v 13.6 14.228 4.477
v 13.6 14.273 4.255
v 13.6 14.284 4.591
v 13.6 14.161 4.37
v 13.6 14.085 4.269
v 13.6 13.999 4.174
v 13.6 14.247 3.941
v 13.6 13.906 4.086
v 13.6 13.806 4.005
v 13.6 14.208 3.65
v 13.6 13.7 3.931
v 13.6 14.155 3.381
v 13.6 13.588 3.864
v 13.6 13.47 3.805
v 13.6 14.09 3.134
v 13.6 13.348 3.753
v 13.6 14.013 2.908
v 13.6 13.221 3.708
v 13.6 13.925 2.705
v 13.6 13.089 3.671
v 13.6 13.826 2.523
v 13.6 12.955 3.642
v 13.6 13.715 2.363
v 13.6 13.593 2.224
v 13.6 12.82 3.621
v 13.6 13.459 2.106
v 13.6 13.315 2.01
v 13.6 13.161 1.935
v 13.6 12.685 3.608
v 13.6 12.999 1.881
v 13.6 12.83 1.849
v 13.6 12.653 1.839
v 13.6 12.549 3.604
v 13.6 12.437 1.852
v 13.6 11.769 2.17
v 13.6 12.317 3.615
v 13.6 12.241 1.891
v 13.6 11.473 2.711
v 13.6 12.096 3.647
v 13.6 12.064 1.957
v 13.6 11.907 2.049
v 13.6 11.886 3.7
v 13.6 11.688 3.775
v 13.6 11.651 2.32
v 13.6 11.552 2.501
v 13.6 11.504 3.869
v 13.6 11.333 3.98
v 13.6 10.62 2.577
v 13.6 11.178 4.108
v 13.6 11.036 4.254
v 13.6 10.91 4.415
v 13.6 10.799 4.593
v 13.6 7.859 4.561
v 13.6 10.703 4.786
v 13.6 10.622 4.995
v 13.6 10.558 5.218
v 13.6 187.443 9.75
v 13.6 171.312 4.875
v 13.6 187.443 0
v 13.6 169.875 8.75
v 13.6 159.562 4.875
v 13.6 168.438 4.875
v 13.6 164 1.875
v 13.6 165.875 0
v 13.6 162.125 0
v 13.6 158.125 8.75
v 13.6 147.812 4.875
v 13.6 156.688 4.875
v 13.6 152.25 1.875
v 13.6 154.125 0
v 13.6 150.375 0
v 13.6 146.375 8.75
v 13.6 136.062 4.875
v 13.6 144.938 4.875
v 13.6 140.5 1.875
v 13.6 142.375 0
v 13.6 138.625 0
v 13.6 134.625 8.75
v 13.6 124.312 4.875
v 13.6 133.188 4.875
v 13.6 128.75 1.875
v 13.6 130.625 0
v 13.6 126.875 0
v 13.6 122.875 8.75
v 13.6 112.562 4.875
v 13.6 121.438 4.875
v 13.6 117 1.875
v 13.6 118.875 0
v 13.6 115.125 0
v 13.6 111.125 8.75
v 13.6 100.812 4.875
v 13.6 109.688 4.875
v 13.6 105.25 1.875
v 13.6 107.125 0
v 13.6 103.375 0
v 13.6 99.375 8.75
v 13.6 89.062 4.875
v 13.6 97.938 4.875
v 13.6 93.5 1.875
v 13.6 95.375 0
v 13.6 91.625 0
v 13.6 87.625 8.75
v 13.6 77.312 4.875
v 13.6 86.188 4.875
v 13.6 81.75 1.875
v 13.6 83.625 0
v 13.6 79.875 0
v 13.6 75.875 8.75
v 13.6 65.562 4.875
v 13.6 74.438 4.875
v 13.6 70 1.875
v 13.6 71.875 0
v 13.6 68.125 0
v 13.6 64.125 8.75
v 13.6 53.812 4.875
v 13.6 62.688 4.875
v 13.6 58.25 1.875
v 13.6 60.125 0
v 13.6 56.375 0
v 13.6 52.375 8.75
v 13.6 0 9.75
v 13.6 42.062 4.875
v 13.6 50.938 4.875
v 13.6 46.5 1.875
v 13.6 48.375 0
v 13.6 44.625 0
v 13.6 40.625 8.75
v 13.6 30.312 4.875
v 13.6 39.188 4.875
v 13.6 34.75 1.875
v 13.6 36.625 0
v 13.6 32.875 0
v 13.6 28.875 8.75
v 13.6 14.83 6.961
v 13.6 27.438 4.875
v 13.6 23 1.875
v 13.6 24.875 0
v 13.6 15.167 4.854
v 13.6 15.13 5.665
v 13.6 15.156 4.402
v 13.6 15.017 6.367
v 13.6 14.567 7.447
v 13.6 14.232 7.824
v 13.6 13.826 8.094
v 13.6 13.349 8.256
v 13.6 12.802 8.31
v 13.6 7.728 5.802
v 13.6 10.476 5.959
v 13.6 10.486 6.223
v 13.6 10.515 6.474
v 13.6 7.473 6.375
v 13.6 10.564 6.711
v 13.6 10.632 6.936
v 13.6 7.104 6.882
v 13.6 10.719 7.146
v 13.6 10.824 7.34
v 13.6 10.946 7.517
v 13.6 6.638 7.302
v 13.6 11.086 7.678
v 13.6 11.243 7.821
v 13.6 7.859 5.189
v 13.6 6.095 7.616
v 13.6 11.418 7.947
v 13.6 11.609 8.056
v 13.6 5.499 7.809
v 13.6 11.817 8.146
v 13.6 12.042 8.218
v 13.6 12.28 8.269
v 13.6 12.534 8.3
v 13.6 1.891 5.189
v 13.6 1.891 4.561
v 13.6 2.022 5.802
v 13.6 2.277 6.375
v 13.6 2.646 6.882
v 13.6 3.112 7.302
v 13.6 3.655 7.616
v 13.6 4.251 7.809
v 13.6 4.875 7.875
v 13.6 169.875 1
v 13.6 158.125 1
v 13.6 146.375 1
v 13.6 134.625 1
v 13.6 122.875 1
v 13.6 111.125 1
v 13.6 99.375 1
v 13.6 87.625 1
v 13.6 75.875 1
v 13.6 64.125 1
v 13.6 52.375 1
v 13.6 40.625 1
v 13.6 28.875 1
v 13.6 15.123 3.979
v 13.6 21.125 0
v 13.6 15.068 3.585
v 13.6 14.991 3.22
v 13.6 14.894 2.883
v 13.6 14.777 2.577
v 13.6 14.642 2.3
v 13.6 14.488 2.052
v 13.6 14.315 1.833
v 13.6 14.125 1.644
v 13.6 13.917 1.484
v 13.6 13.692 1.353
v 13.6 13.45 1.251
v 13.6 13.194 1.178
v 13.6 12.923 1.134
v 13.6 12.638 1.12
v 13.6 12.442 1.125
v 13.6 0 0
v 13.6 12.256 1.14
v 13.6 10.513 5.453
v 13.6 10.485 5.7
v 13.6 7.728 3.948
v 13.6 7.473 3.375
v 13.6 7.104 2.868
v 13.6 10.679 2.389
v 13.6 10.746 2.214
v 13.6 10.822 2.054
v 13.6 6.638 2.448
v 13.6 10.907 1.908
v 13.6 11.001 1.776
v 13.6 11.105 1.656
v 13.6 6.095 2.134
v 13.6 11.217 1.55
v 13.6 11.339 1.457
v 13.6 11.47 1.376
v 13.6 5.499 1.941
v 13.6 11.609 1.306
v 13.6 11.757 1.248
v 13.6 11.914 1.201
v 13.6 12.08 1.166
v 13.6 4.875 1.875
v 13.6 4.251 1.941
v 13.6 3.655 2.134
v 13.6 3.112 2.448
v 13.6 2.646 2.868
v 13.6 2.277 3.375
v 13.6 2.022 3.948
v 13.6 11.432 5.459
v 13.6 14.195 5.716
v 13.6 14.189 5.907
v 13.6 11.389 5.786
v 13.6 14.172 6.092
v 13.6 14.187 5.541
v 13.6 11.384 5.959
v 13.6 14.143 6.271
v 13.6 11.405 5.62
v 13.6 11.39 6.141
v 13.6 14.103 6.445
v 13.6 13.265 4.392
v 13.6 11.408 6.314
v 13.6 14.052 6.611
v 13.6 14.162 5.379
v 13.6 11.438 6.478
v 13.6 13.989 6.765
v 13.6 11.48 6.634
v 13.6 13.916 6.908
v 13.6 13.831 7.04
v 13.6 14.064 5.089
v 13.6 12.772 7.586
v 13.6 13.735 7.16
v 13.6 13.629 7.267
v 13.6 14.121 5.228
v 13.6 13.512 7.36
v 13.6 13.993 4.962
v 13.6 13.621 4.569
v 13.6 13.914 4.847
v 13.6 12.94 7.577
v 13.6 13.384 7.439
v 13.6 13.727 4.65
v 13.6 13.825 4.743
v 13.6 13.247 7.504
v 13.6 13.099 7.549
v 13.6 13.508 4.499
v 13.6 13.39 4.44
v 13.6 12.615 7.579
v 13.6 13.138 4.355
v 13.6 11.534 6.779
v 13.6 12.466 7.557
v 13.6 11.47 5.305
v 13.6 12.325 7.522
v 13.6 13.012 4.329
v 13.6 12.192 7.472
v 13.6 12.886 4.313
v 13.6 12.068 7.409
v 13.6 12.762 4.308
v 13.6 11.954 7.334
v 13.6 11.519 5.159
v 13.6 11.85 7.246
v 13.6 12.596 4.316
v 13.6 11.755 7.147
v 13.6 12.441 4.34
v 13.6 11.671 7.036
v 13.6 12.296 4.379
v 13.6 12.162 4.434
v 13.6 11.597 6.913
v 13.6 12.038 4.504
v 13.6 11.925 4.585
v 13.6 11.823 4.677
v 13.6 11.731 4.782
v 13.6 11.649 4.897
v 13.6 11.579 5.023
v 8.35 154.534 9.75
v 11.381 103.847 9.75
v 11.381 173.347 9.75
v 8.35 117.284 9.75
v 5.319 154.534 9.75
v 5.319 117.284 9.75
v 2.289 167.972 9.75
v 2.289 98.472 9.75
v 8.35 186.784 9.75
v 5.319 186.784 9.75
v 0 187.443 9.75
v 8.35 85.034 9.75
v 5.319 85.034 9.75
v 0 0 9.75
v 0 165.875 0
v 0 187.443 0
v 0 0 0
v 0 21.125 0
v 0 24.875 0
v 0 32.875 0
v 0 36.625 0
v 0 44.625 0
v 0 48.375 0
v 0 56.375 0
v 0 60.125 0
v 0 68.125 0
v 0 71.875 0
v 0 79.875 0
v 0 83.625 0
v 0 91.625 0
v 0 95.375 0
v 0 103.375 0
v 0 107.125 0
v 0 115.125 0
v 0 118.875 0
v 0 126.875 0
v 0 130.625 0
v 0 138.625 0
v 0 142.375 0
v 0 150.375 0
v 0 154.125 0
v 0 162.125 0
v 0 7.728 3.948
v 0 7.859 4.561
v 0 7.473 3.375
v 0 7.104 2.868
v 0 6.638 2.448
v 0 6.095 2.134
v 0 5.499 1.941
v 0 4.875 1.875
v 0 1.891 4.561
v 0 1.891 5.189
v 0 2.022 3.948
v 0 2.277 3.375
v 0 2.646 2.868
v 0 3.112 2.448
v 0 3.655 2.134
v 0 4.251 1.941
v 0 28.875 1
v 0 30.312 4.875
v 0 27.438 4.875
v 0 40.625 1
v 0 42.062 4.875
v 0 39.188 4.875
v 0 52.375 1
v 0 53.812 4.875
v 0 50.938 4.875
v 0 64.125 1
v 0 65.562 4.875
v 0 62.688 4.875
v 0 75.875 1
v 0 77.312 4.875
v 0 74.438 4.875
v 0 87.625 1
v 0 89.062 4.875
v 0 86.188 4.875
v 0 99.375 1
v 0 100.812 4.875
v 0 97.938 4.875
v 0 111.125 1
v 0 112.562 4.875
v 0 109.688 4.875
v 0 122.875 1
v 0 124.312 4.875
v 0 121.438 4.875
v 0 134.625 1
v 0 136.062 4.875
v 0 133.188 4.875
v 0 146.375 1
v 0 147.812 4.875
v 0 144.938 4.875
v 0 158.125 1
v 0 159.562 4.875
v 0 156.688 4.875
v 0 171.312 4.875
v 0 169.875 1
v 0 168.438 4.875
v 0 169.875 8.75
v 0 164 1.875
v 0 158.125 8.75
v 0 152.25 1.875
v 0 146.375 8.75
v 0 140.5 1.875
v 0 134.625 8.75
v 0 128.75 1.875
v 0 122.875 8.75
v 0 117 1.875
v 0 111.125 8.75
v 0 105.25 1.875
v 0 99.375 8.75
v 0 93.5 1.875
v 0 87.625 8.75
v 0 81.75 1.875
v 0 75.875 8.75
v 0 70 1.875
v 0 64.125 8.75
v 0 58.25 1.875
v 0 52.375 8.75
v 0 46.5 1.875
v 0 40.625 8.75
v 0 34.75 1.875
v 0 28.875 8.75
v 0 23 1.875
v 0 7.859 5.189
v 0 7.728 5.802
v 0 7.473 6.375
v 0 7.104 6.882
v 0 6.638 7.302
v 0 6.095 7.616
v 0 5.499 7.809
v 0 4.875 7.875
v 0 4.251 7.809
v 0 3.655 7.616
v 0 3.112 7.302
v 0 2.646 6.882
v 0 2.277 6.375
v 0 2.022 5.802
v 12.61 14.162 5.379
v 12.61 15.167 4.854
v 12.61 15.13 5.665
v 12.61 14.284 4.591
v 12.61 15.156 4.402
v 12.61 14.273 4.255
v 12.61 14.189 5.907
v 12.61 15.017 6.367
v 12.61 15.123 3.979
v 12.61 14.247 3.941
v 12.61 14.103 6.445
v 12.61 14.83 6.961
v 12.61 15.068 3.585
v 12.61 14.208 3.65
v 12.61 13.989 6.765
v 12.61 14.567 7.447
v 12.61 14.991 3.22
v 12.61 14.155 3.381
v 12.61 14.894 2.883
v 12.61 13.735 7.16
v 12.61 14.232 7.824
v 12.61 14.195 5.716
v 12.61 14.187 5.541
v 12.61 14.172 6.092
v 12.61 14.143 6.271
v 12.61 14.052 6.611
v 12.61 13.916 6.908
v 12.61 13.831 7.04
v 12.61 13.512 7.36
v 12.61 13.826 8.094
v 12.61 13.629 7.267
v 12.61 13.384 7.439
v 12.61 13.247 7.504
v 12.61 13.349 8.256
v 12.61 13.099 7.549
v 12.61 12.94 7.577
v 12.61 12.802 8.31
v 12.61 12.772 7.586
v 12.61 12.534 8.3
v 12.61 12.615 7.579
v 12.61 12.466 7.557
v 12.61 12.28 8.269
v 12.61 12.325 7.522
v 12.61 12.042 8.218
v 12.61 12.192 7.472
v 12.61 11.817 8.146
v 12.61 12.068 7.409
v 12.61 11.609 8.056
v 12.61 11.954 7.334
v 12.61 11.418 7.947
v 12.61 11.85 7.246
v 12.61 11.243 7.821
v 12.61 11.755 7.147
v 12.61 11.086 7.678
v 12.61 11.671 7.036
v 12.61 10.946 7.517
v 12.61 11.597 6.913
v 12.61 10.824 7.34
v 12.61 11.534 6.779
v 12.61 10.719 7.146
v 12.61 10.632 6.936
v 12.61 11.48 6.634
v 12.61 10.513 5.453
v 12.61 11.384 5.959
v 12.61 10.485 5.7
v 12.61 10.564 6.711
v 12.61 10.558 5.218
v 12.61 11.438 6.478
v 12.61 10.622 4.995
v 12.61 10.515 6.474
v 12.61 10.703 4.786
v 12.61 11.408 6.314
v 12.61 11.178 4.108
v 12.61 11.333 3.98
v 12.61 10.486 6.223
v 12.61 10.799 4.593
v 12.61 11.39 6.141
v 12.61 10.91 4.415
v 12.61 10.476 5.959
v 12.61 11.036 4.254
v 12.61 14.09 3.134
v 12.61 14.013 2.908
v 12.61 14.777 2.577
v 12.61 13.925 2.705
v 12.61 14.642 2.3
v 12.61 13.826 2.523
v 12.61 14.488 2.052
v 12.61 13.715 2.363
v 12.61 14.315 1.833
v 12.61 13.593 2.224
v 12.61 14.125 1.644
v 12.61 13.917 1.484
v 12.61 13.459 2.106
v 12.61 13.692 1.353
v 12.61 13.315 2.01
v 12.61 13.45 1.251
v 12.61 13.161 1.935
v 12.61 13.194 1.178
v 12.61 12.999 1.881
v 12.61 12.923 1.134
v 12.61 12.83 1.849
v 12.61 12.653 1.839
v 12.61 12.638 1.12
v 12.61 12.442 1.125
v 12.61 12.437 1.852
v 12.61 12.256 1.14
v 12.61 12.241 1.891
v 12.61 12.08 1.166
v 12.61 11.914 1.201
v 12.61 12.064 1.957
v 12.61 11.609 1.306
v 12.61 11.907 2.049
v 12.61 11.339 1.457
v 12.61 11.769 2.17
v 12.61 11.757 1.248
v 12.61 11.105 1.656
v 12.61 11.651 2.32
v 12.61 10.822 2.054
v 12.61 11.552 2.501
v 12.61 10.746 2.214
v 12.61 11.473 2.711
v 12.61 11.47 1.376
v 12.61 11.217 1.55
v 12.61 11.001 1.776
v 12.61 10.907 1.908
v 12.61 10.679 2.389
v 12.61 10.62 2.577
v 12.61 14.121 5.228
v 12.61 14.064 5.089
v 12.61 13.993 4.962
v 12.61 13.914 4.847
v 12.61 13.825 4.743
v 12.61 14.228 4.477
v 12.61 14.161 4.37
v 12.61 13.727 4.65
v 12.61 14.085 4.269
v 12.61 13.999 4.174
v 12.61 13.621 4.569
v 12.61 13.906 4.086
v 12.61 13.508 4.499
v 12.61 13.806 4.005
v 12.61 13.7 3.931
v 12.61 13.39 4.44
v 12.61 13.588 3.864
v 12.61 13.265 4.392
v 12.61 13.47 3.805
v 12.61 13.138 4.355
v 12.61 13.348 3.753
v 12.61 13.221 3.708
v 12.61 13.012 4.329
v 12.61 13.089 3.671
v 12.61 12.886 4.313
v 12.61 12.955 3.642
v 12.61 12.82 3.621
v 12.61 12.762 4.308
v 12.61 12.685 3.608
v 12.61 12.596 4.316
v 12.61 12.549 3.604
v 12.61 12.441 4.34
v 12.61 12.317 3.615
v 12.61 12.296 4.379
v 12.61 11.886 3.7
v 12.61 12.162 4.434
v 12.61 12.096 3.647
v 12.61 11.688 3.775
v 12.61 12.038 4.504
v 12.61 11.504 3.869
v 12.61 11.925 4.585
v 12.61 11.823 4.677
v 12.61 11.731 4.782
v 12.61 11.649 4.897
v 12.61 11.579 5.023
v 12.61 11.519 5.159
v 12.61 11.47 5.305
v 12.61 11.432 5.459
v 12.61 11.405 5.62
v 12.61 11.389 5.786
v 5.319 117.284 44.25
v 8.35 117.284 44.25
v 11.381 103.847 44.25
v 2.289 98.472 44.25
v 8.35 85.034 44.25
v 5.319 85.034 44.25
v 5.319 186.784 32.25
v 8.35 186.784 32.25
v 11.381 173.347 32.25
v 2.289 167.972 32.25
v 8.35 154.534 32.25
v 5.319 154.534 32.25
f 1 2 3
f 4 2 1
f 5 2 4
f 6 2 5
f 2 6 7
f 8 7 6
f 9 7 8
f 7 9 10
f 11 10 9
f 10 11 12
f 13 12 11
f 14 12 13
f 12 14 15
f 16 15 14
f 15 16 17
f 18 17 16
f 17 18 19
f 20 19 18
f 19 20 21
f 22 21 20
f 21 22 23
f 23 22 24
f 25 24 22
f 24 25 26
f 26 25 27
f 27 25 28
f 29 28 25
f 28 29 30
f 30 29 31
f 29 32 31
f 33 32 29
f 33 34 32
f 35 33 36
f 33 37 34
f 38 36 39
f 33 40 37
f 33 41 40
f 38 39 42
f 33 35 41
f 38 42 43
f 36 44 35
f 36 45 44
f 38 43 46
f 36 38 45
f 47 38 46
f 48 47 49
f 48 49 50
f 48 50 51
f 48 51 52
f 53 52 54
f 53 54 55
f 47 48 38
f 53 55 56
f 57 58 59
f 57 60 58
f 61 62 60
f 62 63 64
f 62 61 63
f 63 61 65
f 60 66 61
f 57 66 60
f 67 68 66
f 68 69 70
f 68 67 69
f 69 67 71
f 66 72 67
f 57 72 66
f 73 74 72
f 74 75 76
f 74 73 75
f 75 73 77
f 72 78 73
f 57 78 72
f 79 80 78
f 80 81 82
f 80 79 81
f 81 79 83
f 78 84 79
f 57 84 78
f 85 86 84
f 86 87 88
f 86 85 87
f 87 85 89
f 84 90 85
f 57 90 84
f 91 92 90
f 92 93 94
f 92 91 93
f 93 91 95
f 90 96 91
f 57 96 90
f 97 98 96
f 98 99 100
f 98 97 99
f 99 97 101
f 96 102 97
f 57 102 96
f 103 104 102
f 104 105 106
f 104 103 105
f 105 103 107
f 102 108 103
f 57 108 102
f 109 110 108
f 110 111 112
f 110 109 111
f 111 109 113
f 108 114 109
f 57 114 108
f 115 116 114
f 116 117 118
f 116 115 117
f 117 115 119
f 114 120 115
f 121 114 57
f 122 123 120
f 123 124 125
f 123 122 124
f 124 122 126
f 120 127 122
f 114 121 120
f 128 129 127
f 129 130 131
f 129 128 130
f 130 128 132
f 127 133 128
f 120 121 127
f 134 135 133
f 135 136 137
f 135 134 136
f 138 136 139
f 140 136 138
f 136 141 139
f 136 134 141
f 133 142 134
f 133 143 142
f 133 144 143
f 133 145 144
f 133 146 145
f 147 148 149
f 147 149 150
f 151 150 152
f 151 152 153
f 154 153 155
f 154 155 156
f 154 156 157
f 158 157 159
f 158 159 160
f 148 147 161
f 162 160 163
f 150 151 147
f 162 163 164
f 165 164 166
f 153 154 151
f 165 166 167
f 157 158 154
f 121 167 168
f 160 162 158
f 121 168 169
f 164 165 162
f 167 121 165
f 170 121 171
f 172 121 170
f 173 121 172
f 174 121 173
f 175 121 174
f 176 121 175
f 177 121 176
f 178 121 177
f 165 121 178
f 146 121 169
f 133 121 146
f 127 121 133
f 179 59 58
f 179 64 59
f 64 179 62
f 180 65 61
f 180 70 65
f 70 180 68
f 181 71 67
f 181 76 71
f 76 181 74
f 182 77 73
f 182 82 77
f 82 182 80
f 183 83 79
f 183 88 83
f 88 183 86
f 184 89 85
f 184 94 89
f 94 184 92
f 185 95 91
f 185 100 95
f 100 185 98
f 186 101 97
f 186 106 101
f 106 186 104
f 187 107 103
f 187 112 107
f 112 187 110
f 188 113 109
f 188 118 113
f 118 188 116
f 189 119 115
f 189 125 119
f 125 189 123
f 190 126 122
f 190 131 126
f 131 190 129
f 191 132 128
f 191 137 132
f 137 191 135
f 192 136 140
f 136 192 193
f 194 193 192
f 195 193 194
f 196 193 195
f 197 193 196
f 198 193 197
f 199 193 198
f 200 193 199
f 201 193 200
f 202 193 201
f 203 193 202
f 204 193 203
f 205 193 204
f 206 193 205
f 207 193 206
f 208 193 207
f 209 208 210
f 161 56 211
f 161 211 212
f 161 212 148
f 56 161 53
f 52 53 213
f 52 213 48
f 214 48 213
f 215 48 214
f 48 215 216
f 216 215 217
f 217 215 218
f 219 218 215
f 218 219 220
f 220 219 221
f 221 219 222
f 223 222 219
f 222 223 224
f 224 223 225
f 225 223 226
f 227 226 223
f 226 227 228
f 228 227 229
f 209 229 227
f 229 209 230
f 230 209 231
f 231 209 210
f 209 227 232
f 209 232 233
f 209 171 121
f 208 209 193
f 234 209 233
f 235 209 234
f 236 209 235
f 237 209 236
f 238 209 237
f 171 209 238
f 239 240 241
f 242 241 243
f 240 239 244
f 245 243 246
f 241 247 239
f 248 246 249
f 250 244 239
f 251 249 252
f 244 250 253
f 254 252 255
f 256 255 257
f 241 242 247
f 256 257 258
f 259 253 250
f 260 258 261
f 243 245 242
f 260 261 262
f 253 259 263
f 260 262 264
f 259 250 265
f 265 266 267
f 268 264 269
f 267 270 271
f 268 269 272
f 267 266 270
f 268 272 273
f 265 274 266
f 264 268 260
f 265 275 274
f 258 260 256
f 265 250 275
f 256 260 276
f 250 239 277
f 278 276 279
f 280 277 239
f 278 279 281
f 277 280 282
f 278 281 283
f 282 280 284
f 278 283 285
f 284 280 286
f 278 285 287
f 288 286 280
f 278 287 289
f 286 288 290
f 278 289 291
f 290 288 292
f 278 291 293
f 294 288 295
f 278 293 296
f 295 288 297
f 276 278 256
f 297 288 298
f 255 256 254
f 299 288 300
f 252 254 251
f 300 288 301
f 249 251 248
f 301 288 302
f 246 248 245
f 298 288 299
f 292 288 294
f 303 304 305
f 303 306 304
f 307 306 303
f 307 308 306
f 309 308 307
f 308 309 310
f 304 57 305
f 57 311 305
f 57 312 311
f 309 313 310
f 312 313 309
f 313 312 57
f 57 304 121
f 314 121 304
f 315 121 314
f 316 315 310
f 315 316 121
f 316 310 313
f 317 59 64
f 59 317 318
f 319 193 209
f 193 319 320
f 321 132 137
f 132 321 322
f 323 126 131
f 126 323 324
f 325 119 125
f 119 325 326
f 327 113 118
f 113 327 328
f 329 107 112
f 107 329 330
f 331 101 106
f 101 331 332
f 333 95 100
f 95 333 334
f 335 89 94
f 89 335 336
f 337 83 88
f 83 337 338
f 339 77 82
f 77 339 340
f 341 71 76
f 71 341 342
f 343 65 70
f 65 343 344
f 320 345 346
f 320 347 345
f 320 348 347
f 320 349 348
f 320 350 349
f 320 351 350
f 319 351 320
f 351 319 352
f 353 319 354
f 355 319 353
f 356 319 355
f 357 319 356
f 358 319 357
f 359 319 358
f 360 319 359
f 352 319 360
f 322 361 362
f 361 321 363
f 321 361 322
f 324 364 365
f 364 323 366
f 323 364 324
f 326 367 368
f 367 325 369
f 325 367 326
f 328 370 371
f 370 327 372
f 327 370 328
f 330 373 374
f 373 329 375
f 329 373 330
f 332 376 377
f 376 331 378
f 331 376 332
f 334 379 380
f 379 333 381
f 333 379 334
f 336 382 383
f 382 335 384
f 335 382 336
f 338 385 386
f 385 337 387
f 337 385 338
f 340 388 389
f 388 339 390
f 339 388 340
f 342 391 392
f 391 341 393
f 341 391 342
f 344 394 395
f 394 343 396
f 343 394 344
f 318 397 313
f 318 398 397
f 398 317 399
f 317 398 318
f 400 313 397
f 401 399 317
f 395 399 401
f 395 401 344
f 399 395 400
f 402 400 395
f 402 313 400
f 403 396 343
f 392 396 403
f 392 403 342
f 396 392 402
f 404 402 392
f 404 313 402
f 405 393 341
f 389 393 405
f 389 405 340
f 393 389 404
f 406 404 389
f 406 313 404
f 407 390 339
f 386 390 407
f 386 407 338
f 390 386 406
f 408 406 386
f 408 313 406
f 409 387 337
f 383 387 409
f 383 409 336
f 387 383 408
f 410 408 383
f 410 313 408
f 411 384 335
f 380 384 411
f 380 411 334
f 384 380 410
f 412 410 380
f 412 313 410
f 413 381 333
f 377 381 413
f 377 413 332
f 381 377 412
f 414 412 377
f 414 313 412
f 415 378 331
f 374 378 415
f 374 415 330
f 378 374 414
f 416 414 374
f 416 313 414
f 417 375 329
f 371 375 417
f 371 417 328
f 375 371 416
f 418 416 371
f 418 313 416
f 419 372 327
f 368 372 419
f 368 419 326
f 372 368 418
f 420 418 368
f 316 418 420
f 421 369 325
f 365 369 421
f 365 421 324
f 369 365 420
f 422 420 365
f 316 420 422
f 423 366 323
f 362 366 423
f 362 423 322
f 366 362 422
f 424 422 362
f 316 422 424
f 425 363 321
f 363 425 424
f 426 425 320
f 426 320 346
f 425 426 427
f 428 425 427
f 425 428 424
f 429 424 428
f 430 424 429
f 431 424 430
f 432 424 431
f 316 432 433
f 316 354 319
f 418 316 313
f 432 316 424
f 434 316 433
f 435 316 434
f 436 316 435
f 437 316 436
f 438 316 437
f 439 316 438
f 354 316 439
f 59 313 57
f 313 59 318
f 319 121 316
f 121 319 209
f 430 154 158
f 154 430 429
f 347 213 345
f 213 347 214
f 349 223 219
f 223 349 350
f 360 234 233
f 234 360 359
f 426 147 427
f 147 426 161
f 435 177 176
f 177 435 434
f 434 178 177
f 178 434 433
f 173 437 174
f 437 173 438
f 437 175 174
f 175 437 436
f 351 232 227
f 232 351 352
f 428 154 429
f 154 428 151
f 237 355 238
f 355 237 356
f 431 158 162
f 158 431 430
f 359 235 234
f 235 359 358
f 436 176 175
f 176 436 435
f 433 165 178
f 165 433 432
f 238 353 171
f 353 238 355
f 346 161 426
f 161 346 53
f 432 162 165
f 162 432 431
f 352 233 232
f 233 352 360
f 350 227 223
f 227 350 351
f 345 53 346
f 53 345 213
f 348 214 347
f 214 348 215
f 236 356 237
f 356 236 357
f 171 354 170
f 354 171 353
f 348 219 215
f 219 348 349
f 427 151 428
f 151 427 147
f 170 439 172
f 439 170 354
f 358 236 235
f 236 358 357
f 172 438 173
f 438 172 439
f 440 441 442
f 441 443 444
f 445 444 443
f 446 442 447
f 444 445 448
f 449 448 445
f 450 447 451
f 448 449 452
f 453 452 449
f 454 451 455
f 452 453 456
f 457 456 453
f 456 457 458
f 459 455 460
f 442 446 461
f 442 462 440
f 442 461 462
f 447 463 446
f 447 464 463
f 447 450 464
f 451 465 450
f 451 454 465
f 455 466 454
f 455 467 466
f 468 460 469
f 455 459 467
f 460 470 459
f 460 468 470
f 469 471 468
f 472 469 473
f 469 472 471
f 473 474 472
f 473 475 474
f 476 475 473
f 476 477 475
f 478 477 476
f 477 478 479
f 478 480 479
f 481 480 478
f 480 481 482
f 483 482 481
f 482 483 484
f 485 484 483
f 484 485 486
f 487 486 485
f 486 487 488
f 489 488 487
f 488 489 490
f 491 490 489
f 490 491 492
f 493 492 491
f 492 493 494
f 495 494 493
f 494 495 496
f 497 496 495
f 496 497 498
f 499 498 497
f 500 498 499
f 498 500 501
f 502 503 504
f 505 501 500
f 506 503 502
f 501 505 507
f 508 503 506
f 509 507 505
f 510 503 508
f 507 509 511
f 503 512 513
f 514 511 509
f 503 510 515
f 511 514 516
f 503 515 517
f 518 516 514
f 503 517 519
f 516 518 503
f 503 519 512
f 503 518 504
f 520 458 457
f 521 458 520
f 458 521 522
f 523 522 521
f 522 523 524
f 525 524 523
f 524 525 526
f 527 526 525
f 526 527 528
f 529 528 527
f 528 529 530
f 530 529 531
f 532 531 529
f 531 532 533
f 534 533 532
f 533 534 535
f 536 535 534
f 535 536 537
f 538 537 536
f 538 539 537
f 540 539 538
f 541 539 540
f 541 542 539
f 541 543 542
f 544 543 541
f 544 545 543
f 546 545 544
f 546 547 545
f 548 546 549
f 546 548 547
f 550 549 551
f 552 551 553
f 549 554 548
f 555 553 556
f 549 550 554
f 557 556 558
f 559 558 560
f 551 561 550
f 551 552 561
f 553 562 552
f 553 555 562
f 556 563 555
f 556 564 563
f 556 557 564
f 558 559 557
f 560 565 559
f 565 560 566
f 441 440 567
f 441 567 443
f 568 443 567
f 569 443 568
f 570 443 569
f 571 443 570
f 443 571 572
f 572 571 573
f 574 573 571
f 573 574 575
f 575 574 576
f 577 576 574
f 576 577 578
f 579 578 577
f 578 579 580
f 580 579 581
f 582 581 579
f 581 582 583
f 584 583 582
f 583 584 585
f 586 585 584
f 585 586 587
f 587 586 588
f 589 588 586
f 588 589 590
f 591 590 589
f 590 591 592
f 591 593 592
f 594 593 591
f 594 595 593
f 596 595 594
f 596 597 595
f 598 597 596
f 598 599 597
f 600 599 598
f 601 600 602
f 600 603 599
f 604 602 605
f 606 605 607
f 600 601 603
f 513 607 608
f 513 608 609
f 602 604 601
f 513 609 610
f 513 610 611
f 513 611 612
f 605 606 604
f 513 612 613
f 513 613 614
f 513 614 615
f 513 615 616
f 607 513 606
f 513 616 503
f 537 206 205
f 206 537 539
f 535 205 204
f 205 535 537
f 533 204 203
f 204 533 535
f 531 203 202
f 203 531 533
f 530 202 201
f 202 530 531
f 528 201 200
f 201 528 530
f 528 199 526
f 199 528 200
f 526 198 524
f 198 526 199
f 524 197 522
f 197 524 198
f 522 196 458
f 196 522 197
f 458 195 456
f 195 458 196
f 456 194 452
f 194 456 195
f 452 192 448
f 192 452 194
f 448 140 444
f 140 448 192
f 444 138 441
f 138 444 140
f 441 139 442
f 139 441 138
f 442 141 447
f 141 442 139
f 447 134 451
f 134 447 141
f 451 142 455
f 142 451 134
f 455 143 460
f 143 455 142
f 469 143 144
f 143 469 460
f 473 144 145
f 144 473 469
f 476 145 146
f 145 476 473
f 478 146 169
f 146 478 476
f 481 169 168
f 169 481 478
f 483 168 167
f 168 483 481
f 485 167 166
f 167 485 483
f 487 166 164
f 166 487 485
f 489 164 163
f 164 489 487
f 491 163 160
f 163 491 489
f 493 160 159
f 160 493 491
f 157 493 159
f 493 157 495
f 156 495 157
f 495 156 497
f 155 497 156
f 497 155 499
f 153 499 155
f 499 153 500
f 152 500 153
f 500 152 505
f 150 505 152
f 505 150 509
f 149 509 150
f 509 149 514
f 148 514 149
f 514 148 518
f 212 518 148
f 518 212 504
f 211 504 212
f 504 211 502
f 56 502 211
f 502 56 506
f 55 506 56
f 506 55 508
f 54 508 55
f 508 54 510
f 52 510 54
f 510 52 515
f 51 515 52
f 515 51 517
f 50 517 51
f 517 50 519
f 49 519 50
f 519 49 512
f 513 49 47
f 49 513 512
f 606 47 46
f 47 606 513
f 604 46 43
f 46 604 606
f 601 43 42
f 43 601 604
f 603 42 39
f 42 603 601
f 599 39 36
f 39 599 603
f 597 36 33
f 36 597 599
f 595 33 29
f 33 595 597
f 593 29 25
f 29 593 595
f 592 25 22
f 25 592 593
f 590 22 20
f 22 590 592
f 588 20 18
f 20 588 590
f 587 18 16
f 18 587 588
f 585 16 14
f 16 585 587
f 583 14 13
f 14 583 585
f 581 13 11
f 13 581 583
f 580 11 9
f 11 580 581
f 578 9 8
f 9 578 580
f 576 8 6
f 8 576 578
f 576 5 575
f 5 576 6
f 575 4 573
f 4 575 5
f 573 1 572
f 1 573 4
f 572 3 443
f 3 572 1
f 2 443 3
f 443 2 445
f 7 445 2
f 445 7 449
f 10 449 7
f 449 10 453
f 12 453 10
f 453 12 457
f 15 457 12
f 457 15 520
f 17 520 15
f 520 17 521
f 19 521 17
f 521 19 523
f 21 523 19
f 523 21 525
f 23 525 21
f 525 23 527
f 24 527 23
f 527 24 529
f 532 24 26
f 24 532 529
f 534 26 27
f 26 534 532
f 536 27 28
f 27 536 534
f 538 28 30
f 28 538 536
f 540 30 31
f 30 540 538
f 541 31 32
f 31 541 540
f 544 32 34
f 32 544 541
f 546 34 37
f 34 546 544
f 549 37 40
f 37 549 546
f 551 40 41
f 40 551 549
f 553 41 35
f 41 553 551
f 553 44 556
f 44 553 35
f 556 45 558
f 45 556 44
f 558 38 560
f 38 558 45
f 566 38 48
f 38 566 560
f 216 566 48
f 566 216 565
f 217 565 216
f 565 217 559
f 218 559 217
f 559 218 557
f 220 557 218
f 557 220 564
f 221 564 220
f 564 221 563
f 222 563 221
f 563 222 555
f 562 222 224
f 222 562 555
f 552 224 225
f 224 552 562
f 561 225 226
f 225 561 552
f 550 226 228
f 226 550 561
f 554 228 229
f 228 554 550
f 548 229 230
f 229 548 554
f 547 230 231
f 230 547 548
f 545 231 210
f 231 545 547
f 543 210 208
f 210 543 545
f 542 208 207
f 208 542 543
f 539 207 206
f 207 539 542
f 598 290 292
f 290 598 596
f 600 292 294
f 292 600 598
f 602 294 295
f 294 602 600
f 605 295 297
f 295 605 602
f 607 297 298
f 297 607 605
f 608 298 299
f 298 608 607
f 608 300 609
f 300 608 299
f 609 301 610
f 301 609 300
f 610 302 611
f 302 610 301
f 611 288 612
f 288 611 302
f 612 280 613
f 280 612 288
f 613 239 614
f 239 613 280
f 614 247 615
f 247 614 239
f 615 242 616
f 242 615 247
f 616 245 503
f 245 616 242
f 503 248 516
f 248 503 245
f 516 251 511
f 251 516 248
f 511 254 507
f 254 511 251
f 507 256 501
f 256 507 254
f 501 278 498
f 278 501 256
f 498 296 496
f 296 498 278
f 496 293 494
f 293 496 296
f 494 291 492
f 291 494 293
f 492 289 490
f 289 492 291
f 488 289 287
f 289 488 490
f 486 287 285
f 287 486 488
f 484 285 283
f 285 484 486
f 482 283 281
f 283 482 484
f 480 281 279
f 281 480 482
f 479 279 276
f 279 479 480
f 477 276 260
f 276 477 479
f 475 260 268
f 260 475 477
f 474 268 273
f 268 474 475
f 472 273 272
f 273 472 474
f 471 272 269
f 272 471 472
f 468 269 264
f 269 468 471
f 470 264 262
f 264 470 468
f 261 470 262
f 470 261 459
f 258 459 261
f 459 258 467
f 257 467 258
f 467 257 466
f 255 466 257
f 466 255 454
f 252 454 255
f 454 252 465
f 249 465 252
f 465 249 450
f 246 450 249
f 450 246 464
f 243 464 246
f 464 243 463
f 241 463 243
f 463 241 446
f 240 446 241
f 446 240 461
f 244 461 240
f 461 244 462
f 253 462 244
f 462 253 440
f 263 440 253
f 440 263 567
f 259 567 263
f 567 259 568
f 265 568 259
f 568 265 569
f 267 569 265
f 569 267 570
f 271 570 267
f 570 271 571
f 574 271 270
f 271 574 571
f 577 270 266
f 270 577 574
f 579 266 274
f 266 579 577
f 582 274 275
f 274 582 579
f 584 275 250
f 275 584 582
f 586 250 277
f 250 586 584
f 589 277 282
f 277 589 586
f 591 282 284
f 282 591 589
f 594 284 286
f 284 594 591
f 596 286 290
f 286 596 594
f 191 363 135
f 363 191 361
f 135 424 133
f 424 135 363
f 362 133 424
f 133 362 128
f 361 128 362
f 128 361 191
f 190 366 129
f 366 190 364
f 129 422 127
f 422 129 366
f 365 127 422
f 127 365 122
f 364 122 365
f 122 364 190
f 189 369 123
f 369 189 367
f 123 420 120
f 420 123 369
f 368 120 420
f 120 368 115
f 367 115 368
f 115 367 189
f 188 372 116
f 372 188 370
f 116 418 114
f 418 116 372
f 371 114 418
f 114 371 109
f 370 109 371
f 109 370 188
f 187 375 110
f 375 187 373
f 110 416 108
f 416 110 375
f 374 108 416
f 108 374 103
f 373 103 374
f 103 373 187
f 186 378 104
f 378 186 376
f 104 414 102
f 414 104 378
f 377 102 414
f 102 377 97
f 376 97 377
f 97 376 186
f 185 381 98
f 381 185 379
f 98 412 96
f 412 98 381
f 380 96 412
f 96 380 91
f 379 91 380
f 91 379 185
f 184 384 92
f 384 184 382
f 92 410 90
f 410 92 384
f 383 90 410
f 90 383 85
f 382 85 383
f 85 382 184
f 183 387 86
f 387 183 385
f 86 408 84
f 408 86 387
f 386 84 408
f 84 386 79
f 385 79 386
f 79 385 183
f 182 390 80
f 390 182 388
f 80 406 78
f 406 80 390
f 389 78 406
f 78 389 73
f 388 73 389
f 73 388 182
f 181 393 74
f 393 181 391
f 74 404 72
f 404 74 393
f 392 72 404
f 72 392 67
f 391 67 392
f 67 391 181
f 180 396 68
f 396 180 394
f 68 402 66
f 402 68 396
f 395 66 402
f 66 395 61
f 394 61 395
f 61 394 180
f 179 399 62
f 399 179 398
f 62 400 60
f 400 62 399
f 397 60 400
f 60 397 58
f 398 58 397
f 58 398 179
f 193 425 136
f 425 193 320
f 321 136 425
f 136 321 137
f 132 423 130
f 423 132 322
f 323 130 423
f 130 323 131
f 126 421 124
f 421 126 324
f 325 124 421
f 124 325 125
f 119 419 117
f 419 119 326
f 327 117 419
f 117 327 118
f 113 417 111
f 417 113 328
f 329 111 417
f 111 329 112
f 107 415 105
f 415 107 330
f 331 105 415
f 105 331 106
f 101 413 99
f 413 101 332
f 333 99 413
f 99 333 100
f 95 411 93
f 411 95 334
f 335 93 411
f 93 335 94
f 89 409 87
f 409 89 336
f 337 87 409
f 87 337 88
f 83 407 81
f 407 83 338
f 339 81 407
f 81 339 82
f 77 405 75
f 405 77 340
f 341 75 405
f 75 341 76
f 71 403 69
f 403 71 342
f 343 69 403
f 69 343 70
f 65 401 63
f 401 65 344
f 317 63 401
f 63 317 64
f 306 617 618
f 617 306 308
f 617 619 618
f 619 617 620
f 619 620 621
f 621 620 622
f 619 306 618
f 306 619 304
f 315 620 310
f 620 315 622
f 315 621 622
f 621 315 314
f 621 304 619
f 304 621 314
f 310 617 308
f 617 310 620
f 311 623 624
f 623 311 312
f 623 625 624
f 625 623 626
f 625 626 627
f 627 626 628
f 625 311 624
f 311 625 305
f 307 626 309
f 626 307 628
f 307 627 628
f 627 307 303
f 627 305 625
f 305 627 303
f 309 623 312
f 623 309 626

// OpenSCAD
// file: values.scad
$fs=0.1;
//Constants:
edgeRadius=1.5;
underKeyWidth=13.6;
baseHeight=9.75;
genh=5.791666666666667;
a=27.423996629776394;
b=12.370392724366756;
c=12.370392724366756;
d=38.393595281686956;
overhead=65.81759191146335;
keyTravelDistance=13.0;
desiredGamut=24;
shift=3.092598181091689;
holeScale=0.5;
stalkScale=0.48;

Points = [
[shift,a,0],//0
[(b-shift),0,0],//1
[(b+shift),0,0],//2
[(b+c-shift),d,0],//3
[(c+shift),(a+d),0],//4
[(c-shift),(a+d),0],//5
[shift,a,keyTravelDistance],//6
[(b-shift),0,keyTravelDistance],//7
[(b+shift),0,keyTravelDistance],//8
[(b+c-shift),d,keyTravelDistance],//9
[(c+shift),(a+d),keyTravelDistance],//10
[(c-shift),(a+d),keyTravelDistance],//11
];
Faces = [
[0,1,2,3,4,5],
[1,0,6,7],
[2,1,7,8],
[3,2,8,9],
[4,3,9,10],
[5,4,10,11],
[0,5,11,6],
[11,10,9,8,7,6] 
];
// file: keytop.scad
include<values.scad>;
keytop();

module keytopShape(){
polyhedron(Points,Faces);
}
module keytop(){
difference(){
keytopShape();
translate([(b+c)/4,(d+a)/4,-0.1])
scale(holeScale,holeScale,holeScale)
keytopShape();
edge(6,11,1,-1);
edge(6,7,1,1);
edge(7,8,1,1);
edge(8,9,1,1);
edge(9,10,1,-1,-1);
edge(10,11,1,-1);
}
module edge (point1,point2,d1,d2,d3=1){
difference(){
translate([Points[point1][0],Points[point1][1],Points[point1][2]])
rotate([0,90,atan((Points[point2][1]-Points[point1][1])/(Points[point2][0]-Points[point1][0]))])
translate([0,0,d3*30])
rotate(45,0,0)
cube([pow(2*(edgeRadius*edgeRadius),1/2),pow(2*(edgeRadius*edgeRadius),1/2),90],true);
translate([Points[point1][0],Points[point1][1],Points[point1][2]])
rotate([0,90,atan((Points[point2][1]-Points[point1][1])/(Points[point2][0]-Points[point1][0]))])
translate([d1*edgeRadius,d2*edgeRadius,d3*30])
cylinder(90,edgeRadius,edgeRadius, true);
}
}

}
// main file
use<keytop.scad>
include<values.scad>
rotate([0,90,0])9_9();
module 9_9(keytops=false){
length=187.44259191146335;
rotate([0,-90,0]){
//Main Base:
difference(){
cube([underKeyWidth,length,baseHeight],false);
translate([-.1,0.5*baseHeight,0.5*baseHeight])rotate([0,90,0])
cylinder((underKeyWidth+.2),r=3, false);
translate([underKeyWidth-.99,10,0.125*baseHeight])
rotate([90,0,90])
linear_extrude(height=1){
text("9",size=baseHeight*0.75);
}

//Warp Cuts:
translate([-1,0.0+25+0.25*baseHeight,baseHeight-1])
rotate([0,90,0])
linear_extrude(height=underKeyWidth+2)
polygon(points=[[0.5*baseHeight-1,0],[baseHeight-2,0.25*baseHeight-1],[0.5*baseHeight-1,0.5*baseHeight-2],[0,0.25*baseHeight-1]]);
translate([-1,11.75+25+0.25*baseHeight,baseHeight-1])
rotate([0,90,0])
linear_extrude(height=underKeyWidth+2)
polygon(points=[[0.5*baseHeight-1,0],[baseHeight-2,0.25*baseHeight-1],[0.5*baseHeight-1,0.5*baseHeight-2],[0,0.25*baseHeight-1]]);
translate([-1,23.5+25+0.25*baseHeight,baseHeight-1])
rotate([0,90,0])
linear_extrude(height=underKeyWidth+2)
polygon(points=[[0.5*baseHeight-1,0],[baseHeight-2,0.25*baseHeight-1],[0.5*baseHeight-1,0.5*baseHeight-2],[0,0.25*baseHeight-1]]);
translate([-1,35.25+25+0.25*baseHeight,baseHeight-1])
rotate([0,90,0])
linear_extrude(height=underKeyWidth+2)
polygon(points=[[0.5*baseHeight-1,0],[baseHeight-2,0.25*baseHeight-1],[0.5*baseHeight-1,0.5*baseHeight-2],[0,0.25*baseHeight-1]]);
translate([-1,47.0+25+0.25*baseHeight,baseHeight-1])
rotate([0,90,0])
linear_extrude(height=underKeyWidth+2)
polygon(points=[[0.5*baseHeight-1,0],[baseHeight-2,0.25*baseHeight-1],[0.5*baseHeight-1,0.5*baseHeight-2],[0,0.25*baseHeight-1]]);
translate([-1,58.75+25+0.25*baseHeight,baseHeight-1])
rotate([0,90,0])
linear_extrude(height=underKeyWidth+2)
polygon(points=[[0.5*baseHeight-1,0],[baseHeight-2,0.25*baseHeight-1],[0.5*baseHeight-1,0.5*baseHeight-2],[0,0.25*baseHeight-1]]);
translate([-1,70.5+25+0.25*baseHeight,baseHeight-1])
rotate([0,90,0])
linear_extrude(height=underKeyWidth+2)
polygon(points=[[0.5*baseHeight-1,0],[baseHeight-2,0.25*baseHeight-1],[0.5*baseHeight-1,0.5*baseHeight-2],[0,0.25*baseHeight-1]]);
translate([-1,82.25+25+0.25*baseHeight,baseHeight-1])
rotate([0,90,0])
linear_extrude(height=underKeyWidth+2)
polygon(points=[[0.5*baseHeight-1,0],[baseHeight-2,0.25*baseHeight-1],[0.5*baseHeight-1,0.5*baseHeight-2],[0,0.25*baseHeight-1]]);
translate([-1,94.0+25+0.25*baseHeight,baseHeight-1])
rotate([0,90,0])
linear_extrude(height=underKeyWidth+2)
polygon(points=[[0.5*baseHeight-1,0],[baseHeight-2,0.25*baseHeight-1],[0.5*baseHeight-1,0.5*baseHeight-2],[0,0.25*baseHeight-1]]);
translate([-1,105.75+25+0.25*baseHeight,baseHeight-1])
rotate([0,90,0])
linear_extrude(height=underKeyWidth+2)
polygon(points=[[0.5*baseHeight-1,0],[baseHeight-2,0.25*baseHeight-1],[0.5*baseHeight-1,0.5*baseHeight-2],[0,0.25*baseHeight-1]]);
translate([-1,117.5+25+0.25*baseHeight,baseHeight-1])
rotate([0,90,0])
linear_extrude(height=underKeyWidth+2)
polygon(points=[[0.5*baseHeight-1,0],[baseHeight-2,0.25*baseHeight-1],[0.5*baseHeight-1,0.5*baseHeight-2],[0,0.25*baseHeight-1]]);
translate([-1,129.25+25+0.25*baseHeight,baseHeight-1])
rotate([0,90,0])
linear_extrude(height=underKeyWidth+2)
polygon(points=[[0.5*baseHeight-1,0],[baseHeight-2,0.25*baseHeight-1],[0.5*baseHeight-1,0.5*baseHeight-2],[0,0.25*baseHeight-1]]);
translate([-1,141.0+25+0.25*baseHeight,baseHeight-1])
rotate([0,90,0])
linear_extrude(height=underKeyWidth+2)
polygon(points=[[0.5*baseHeight-1,0],[baseHeight-2,0.25*baseHeight-1],[0.5*baseHeight-1,0.5*baseHeight-2],[0,0.25*baseHeight-1]]);
translate([-1,0.0+25-0.5*baseHeight-1,0.5*baseHeight-3])
rotate([0,90,0])
linear_extrude(height=underKeyWidth+2)
polygon(points=[[0.5*baseHeight-1,0],[baseHeight-2,0.5*baseHeight-1],[0.5*baseHeight-1,baseHeight-2],[0,0.5*baseHeight-1]]);
translate([-1,11.75+25-0.5*baseHeight-1,0.5*baseHeight-3])
rotate([0,90,0])
linear_extrude(height=underKeyWidth+2)
polygon(points=[[0.5*baseHeight-1,0],[baseHeight-2,0.5*baseHeight-1],[0.5*baseHeight-1,baseHeight-2],[0,0.5*baseHeight-1]]);
translate([-1,23.5+25-0.5*baseHeight-1,0.5*baseHeight-3])
rotate([0,90,0])
linear_extrude(height=underKeyWidth+2)
polygon(points=[[0.5*baseHeight-1,0],[baseHeight-2,0.5*baseHeight-1],[0.5*baseHeight-1,baseHeight-2],[0,0.5*baseHeight-1]]);
translate([-1,35.25+25-0.5*baseHeight-1,0.5*baseHeight-3])
rotate([0,90,0])
linear_extrude(height=underKeyWidth+2)
polygon(points=[[0.5*baseHeight-1,0],[baseHeight-2,0.5*baseHeight-1],[0.5*baseHeight-1,baseHeight-2],[0,0.5*baseHeight-1]]);
translate([-1,47.0+25-0.5*baseHeight-1,0.5*baseHeight-3])
rotate([0,90,0])
linear_extrude(height=underKeyWidth+2)
polygon(points=[[0.5*baseHeight-1,0],[baseHeight-2,0.5*baseHeight-1],[0.5*baseHeight-1,baseHeight-2],[0,0.5*baseHeight-1]]);
translate([-1,58.75+25-0.5*baseHeight-1,0.5*baseHeight-3])
rotate([0,90,0])
linear_extrude(height=underKeyWidth+2)
polygon(points=[[0.5*baseHeight-1,0],[baseHeight-2,0.5*baseHeight-1],[0.5*baseHeight-1,baseHeight-2],[0,0.5*baseHeight-1]]);
translate([-1,70.5+25-0.5*baseHeight-1,0.5*baseHeight-3])
rotate([0,90,0])
linear_extrude(height=underKeyWidth+2)
polygon(points=[[0.5*baseHeight-1,0],[baseHeight-2,0.5*baseHeight-1],[0.5*baseHeight-1,baseHeight-2],[0,0.5*baseHeight-1]]);
translate([-1,82.25+25-0.5*baseHeight-1,0.5*baseHeight-3])
rotate([0,90,0])
linear_extrude(height=underKeyWidth+2)
polygon(points=[[0.5*baseHeight-1,0],[baseHeight-2,0.5*baseHeight-1],[0.5*baseHeight-1,baseHeight-2],[0,0.5*baseHeight-1]]);
translate([-1,94.0+25-0.5*baseHeight-1,0.5*baseHeight-3])
rotate([0,90,0])
linear_extrude(height=underKeyWidth+2)
polygon(points=[[0.5*baseHeight-1,0],[baseHeight-2,0.5*baseHeight-1],[0.5*baseHeight-1,baseHeight-2],[0,0.5*baseHeight-1]]);
translate([-1,105.75+25-0.5*baseHeight-1,0.5*baseHeight-3])
rotate([0,90,0])
linear_extrude(height=underKeyWidth+2)
polygon(points=[[0.5*baseHeight-1,0],[baseHeight-2,0.5*baseHeight-1],[0.5*baseHeight-1,baseHeight-2],[0,0.5*baseHeight-1]]);
translate([-1,117.5+25-0.5*baseHeight-1,0.5*baseHeight-3])
rotate([0,90,0])
linear_extrude(height=underKeyWidth+2)
polygon(points=[[0.5*baseHeight-1,0],[baseHeight-2,0.5*baseHeight-1],[0.5*baseHeight-1,baseHeight-2],[0,0.5*baseHeight-1]]);
translate([-1,129.25+25-0.5*baseHeight-1,0.5*baseHeight-3])
rotate([0,90,0])
linear_extrude(height=underKeyWidth+2)
polygon(points=[[0.5*baseHeight-1,0],[baseHeight-2,0.5*baseHeight-1],[0.5*baseHeight-1,baseHeight-2],[0,0.5*baseHeight-1]]);
translate([-1,141.0+25-0.5*baseHeight-1,0.5*baseHeight-3])
rotate([0,90,0])
linear_extrude(height=underKeyWidth+2)
polygon(points=[[0.5*baseHeight-1,0],[baseHeight-2,0.5*baseHeight-1],[0.5*baseHeight-1,baseHeight-2],[0,0.5*baseHeight-1]]);
}
//Key Stalks:
translate([shift/4,(genh*9-(d+a)/2+overhead),baseHeight]){
linear_extrude(height=(keyTravelDistance*1.5+desiredGamut-9)){
scale((stalkScale+holeScale)/2,stalkScale)
polygon(points=[
[Points[0][0],Points[0][1]],[Points[1][0],Points[1][1]],[Points[2][0],Points[2][1]],[Points[3][0],Points[3][1]],[Points[4][0],Points[4][1]],[Points[5][0],Points[5][1]],[Points[6][0],Points[6][1]]
]);
}
if(keytops)
translate([0,(-0.5*(a+d)),(keyTravelDistance*1.5+desiredGamut-9+40)])
keytop();
}
translate([shift/4,(genh*21-(d+a)/2+overhead),baseHeight]){
linear_extrude(height=(keyTravelDistance*1.5+desiredGamut-21)){
scale((stalkScale+holeScale)/2,stalkScale)
polygon(points=[
[Points[0][0],Points[0][1]],[Points[1][0],Points[1][1]],[Points[2][0],Points[2][1]],[Points[3][0],Points[3][1]],[Points[4][0],Points[4][1]],[Points[5][0],Points[5][1]],[Points[6][0],Points[6][1]]
]);
}
if(keytops)
translate([0,(-0.5*(a+d)),(keyTravelDistance*1.5+desiredGamut-21+40)])
keytop();
}
}}
